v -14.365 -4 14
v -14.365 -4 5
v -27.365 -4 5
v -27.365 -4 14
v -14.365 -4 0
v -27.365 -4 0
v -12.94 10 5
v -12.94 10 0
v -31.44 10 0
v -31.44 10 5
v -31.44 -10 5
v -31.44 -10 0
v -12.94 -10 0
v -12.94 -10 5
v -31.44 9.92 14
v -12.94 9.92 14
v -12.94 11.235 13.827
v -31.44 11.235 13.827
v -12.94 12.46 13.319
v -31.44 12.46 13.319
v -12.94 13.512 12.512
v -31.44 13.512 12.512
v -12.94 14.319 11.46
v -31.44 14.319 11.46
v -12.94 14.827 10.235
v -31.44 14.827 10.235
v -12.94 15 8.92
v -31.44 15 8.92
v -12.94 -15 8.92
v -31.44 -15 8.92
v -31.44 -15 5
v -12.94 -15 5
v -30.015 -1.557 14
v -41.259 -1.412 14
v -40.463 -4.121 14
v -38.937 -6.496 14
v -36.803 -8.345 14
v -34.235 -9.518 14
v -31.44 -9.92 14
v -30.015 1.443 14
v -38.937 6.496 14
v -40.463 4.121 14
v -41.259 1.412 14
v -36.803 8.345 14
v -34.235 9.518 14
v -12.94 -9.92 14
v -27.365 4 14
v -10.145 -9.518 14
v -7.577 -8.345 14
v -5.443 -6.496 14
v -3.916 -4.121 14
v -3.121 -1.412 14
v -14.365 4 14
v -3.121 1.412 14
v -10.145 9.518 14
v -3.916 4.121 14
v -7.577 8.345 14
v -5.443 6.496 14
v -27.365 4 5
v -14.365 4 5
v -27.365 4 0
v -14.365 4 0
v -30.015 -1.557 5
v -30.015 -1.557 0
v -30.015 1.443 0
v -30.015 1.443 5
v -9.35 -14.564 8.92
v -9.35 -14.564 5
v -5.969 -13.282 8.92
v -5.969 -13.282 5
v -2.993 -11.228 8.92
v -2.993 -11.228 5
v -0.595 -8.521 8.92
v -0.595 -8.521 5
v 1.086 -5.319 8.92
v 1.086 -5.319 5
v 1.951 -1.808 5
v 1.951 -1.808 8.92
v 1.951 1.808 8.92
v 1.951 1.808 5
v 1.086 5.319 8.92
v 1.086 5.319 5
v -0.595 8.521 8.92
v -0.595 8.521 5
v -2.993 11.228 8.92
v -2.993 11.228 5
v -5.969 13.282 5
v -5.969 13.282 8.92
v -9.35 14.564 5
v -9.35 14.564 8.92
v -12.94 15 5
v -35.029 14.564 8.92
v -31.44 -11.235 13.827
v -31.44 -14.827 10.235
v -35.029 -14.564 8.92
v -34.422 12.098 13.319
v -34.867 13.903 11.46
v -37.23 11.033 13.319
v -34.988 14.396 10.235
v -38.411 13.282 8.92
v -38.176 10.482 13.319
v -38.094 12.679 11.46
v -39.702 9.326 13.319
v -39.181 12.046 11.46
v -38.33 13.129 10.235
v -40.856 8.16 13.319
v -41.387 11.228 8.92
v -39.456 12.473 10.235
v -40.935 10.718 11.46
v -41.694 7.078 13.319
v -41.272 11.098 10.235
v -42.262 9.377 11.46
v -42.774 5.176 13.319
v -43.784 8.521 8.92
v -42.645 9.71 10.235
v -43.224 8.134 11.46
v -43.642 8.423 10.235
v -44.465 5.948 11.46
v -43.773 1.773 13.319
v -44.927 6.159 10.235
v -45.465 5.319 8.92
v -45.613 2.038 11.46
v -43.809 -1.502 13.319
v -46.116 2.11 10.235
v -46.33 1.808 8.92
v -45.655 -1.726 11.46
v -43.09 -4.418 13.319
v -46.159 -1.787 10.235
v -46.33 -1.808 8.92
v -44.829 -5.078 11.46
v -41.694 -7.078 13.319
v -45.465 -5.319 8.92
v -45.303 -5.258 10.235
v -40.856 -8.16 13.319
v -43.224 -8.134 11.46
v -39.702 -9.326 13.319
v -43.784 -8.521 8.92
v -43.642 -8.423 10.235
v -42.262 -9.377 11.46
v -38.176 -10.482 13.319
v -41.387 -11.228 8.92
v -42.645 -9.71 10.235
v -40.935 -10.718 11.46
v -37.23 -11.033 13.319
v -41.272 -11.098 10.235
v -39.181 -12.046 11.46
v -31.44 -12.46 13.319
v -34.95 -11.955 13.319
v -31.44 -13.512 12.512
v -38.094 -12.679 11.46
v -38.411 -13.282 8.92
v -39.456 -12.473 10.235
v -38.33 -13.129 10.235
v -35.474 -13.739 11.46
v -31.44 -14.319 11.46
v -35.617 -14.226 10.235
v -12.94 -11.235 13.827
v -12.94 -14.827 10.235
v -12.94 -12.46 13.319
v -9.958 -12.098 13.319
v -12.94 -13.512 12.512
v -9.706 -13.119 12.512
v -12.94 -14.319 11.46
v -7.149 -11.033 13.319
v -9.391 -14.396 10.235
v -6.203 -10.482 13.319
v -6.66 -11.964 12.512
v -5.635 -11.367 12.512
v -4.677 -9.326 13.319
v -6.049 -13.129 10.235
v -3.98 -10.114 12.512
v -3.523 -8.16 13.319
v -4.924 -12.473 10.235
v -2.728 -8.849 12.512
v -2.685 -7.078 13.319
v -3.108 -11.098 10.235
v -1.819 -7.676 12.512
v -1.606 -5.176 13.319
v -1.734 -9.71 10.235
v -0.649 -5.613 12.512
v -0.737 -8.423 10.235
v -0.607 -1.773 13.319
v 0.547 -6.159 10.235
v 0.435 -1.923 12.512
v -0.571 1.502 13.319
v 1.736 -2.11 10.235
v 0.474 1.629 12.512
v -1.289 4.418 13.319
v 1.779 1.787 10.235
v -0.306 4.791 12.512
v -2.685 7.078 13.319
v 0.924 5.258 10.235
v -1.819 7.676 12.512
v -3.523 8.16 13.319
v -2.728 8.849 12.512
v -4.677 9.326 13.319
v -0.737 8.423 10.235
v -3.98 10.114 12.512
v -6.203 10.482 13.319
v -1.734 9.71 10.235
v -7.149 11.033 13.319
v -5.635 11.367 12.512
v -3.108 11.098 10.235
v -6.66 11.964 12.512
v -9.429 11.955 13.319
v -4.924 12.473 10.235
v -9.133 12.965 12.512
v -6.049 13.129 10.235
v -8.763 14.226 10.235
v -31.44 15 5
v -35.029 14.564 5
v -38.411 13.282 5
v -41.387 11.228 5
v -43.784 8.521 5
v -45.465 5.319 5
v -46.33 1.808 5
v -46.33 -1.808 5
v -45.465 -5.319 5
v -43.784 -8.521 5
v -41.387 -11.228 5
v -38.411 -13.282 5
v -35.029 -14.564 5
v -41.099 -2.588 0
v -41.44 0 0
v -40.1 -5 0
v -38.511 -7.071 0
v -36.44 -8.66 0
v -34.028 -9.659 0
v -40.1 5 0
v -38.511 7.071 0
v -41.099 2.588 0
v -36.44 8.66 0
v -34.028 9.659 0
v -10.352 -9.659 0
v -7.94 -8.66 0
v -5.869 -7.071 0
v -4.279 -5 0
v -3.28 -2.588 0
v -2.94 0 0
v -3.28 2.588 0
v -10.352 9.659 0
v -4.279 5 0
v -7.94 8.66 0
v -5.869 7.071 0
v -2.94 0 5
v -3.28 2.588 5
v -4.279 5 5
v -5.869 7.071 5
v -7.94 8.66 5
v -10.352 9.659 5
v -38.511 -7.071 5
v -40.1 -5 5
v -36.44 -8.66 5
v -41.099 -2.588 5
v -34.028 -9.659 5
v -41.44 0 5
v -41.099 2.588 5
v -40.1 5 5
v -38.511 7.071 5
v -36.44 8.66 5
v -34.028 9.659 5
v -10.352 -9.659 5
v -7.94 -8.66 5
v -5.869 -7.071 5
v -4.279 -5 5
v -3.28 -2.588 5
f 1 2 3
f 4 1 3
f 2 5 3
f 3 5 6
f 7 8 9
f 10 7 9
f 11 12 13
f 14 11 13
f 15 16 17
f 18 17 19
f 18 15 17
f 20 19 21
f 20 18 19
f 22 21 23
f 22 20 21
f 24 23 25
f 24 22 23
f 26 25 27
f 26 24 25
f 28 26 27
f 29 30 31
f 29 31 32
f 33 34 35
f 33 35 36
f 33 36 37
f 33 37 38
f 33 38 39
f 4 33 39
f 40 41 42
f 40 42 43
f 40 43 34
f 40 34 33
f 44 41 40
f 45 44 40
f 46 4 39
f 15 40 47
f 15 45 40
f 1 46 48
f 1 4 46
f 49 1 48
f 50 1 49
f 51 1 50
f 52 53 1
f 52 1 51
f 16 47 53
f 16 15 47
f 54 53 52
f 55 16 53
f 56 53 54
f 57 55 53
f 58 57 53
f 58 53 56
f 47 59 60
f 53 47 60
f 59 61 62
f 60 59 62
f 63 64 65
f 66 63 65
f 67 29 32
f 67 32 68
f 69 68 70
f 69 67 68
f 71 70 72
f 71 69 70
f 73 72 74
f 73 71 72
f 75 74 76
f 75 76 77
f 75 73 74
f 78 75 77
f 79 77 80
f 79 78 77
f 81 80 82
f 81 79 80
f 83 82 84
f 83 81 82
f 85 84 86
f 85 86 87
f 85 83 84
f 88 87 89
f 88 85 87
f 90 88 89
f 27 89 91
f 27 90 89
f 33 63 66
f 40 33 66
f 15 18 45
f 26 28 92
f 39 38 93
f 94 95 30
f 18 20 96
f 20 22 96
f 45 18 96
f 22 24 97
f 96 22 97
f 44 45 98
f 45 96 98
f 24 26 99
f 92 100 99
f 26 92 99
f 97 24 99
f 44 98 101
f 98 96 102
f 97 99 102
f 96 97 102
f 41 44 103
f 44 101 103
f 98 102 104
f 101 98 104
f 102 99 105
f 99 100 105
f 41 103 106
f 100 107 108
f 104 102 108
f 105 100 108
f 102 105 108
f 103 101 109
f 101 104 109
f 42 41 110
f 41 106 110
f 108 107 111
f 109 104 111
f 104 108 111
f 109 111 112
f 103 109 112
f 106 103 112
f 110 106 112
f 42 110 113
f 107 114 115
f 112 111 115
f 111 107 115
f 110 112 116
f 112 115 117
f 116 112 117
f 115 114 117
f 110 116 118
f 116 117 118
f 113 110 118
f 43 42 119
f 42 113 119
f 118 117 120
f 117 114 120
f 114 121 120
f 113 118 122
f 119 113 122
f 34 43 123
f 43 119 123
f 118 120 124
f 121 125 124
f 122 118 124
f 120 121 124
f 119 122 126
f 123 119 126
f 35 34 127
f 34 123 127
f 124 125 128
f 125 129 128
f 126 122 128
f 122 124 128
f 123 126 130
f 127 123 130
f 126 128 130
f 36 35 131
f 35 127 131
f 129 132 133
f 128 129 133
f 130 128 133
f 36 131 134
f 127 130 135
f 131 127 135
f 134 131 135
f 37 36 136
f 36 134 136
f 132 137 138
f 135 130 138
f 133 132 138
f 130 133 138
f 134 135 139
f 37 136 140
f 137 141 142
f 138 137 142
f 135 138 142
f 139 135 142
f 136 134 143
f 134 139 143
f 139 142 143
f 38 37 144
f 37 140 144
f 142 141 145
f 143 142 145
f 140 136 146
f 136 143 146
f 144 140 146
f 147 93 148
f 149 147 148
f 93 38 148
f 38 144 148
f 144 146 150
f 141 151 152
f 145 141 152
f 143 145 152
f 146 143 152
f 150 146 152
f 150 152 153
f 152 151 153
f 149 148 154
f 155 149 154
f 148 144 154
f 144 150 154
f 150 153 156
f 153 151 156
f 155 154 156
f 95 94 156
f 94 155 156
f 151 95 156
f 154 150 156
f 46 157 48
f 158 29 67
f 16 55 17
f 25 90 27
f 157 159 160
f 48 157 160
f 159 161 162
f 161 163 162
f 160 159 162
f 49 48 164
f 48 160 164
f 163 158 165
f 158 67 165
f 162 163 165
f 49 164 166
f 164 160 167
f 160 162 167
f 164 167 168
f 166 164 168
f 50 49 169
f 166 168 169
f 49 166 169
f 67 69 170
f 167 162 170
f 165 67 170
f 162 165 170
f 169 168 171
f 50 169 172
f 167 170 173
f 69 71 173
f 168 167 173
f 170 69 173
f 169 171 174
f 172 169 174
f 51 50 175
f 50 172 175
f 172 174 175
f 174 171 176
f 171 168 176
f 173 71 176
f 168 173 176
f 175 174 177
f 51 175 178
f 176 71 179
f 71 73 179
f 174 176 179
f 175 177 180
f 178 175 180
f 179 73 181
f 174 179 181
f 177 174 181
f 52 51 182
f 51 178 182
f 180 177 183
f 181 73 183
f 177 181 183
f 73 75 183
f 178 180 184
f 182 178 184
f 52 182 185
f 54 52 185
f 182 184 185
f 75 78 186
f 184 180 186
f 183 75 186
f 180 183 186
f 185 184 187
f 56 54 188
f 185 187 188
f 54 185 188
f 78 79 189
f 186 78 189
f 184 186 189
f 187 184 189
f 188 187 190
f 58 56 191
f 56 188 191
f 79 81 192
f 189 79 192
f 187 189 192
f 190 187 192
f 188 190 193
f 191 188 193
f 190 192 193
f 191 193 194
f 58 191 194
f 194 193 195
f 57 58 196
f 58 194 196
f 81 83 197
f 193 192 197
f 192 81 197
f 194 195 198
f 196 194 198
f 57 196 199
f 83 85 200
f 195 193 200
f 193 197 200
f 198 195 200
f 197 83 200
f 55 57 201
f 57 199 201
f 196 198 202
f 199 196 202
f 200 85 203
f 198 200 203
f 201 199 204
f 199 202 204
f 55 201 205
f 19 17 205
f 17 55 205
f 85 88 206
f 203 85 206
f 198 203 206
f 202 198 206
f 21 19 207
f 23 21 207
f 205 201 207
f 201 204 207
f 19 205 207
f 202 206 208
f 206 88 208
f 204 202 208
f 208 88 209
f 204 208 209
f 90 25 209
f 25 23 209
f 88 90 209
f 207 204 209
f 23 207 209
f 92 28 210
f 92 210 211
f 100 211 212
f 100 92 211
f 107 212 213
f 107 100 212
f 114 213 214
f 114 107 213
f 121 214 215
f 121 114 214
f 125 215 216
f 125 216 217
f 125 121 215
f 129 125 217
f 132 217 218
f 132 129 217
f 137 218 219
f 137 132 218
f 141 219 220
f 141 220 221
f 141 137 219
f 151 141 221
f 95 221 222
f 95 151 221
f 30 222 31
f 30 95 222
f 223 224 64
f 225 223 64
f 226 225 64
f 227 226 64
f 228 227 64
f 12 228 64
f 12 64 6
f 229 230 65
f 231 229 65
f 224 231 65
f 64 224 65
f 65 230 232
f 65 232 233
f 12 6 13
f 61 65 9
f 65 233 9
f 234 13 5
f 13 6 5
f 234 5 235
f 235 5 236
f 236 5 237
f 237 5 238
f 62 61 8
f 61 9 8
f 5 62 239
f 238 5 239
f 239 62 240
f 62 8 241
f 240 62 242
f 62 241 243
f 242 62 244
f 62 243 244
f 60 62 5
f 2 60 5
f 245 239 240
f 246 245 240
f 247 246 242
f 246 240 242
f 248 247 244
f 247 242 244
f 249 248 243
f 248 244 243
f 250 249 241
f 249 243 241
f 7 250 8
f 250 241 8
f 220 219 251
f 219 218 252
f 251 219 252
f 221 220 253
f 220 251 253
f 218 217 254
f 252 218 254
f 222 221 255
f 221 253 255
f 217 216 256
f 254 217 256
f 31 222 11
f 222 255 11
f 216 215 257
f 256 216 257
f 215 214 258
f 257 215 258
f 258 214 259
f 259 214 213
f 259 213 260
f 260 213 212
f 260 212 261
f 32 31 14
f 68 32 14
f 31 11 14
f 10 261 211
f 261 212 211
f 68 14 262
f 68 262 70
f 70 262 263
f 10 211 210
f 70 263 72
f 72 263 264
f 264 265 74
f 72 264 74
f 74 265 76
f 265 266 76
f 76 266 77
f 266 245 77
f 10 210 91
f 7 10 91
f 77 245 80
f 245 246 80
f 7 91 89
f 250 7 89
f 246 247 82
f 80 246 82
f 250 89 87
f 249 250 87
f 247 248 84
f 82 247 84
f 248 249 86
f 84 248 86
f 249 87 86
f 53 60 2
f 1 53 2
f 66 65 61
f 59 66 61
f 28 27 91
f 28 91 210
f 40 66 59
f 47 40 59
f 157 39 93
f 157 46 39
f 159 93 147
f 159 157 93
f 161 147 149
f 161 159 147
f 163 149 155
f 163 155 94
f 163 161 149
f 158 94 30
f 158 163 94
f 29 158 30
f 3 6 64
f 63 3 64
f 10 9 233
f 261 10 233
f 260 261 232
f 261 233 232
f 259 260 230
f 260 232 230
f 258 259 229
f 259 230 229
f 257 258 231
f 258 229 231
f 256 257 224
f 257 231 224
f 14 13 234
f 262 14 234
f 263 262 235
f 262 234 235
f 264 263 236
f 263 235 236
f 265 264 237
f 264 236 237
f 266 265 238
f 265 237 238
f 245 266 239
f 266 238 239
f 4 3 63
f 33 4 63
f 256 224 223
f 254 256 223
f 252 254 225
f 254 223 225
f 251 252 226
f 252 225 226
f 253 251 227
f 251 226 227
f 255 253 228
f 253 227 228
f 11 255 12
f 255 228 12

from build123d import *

# Parameters (mm, degrees)
F1_DEPTH = 14
F4_DEPTH = 9
F5_DEPTH = 25.4
F6_R     = 5.08


with BuildPart() as f1:
    # F0 (on Top) → F1 (new body)
    with BuildSketch(Plane.XY):
        with BuildLine():
            Line((-22.189739, 10), (-31.439739, 10))
            ThreePointArc((-31.439739, 10), (-38.510807, 7.071068), (-41.439739, 0))
            Line((-41.439739, 0), (-30.014739, 0))
            Line((-30.014739, 0), (-30.014739, 1.443336))
            Line((-30.014739, 1.443336), (-27.364739, 4))
            Line((-27.364739, 4), (-22.189739, 4))
            Line((-22.189739, 4), (-22.189739, 10))
        make_face()
        with BuildLine():
            Line((-30.014739, 0), (-41.439739, 0))
            ThreePointArc((-41.439739, 0), (-38.510807, -7.071068), (-31.439739, -10))
            Line((-31.439739, -10), (-22.189739, -10))
            Line((-22.189739, -10), (-22.189739, -4))
            Line((-22.189739, -4), (-27.364739, -4))
            Line((-27.364739, -4), (-30.014739, -1.556664))
            Line((-30.014739, -1.556664), (-30.014739, 0))
        make_face()
        with BuildLine():
            Line((-12.939739, 10), (-22.189739, 10))
            Line((-22.189739, 10), (-22.189739, 4))
            Line((-22.189739, 4), (-14.364739, 4))
            Line((-14.364739, 4), (-14.364739, 0))
            Line((-14.364739, 0), (-2.939739, 0))
            ThreePointArc((-2.939739, 0), (-5.868671, 7.071068), (-12.939739, 10))
        make_face()
        with BuildLine():
            Line((-22.189739, -4), (-22.189739, -10))
            Line((-22.189739, -10), (-12.939739, -10))
            ThreePointArc((-12.939739, -10), (-5.868671, -7.071068), (-2.939739, 0))
            Line((-2.939739, 0), (-14.364739, 0))
            Line((-14.364739, 0), (-14.364739, -4))
            Line((-14.364739, -4), (-22.189739, -4))
        make_face()
    extrude(amount=F1_DEPTH)

    # F3 (on offset) → F4 (join)
    with BuildSketch(Plane.XY.offset(14)):
        with BuildLine():
            Line((-12.939739, 15), (-31.439739, 15))
            ThreePointArc((-31.439739, 15), (-46.439739, 0), (-31.439739, -15))
            Line((-31.439739, -15), (-12.939739, -15))
            ThreePointArc((-12.939739, -15), (2.060261, 0), (-12.939739, 15))
        make_face()
    extrude(amount=-F4_DEPTH)

    # F4_face (on face) → F5 (cut)
    with BuildSketch(Plane(origin=(-21.801895, -0.002955, 5), x_dir=(1, 0, 0), z_dir=(0, 0, -1))):
        Polygon((-8.212843, -1.446291), (-5.562843, -4.002955), (7.437157, -4.002955), (7.437157, 3.997045), (-5.562843, 3.997045), (-8.212843, 1.553709), align=None)
    extrude(amount=-F5_DEPTH, mode=Mode.SUBTRACT)

    # F6
    f6_edges = [f1.edges().sort_by_distance(p)[0] for p in [
        (-22.189739, -15, 14),
    ]]
    fillet(f6_edges, radius=F6_R)


solid = f1.part
